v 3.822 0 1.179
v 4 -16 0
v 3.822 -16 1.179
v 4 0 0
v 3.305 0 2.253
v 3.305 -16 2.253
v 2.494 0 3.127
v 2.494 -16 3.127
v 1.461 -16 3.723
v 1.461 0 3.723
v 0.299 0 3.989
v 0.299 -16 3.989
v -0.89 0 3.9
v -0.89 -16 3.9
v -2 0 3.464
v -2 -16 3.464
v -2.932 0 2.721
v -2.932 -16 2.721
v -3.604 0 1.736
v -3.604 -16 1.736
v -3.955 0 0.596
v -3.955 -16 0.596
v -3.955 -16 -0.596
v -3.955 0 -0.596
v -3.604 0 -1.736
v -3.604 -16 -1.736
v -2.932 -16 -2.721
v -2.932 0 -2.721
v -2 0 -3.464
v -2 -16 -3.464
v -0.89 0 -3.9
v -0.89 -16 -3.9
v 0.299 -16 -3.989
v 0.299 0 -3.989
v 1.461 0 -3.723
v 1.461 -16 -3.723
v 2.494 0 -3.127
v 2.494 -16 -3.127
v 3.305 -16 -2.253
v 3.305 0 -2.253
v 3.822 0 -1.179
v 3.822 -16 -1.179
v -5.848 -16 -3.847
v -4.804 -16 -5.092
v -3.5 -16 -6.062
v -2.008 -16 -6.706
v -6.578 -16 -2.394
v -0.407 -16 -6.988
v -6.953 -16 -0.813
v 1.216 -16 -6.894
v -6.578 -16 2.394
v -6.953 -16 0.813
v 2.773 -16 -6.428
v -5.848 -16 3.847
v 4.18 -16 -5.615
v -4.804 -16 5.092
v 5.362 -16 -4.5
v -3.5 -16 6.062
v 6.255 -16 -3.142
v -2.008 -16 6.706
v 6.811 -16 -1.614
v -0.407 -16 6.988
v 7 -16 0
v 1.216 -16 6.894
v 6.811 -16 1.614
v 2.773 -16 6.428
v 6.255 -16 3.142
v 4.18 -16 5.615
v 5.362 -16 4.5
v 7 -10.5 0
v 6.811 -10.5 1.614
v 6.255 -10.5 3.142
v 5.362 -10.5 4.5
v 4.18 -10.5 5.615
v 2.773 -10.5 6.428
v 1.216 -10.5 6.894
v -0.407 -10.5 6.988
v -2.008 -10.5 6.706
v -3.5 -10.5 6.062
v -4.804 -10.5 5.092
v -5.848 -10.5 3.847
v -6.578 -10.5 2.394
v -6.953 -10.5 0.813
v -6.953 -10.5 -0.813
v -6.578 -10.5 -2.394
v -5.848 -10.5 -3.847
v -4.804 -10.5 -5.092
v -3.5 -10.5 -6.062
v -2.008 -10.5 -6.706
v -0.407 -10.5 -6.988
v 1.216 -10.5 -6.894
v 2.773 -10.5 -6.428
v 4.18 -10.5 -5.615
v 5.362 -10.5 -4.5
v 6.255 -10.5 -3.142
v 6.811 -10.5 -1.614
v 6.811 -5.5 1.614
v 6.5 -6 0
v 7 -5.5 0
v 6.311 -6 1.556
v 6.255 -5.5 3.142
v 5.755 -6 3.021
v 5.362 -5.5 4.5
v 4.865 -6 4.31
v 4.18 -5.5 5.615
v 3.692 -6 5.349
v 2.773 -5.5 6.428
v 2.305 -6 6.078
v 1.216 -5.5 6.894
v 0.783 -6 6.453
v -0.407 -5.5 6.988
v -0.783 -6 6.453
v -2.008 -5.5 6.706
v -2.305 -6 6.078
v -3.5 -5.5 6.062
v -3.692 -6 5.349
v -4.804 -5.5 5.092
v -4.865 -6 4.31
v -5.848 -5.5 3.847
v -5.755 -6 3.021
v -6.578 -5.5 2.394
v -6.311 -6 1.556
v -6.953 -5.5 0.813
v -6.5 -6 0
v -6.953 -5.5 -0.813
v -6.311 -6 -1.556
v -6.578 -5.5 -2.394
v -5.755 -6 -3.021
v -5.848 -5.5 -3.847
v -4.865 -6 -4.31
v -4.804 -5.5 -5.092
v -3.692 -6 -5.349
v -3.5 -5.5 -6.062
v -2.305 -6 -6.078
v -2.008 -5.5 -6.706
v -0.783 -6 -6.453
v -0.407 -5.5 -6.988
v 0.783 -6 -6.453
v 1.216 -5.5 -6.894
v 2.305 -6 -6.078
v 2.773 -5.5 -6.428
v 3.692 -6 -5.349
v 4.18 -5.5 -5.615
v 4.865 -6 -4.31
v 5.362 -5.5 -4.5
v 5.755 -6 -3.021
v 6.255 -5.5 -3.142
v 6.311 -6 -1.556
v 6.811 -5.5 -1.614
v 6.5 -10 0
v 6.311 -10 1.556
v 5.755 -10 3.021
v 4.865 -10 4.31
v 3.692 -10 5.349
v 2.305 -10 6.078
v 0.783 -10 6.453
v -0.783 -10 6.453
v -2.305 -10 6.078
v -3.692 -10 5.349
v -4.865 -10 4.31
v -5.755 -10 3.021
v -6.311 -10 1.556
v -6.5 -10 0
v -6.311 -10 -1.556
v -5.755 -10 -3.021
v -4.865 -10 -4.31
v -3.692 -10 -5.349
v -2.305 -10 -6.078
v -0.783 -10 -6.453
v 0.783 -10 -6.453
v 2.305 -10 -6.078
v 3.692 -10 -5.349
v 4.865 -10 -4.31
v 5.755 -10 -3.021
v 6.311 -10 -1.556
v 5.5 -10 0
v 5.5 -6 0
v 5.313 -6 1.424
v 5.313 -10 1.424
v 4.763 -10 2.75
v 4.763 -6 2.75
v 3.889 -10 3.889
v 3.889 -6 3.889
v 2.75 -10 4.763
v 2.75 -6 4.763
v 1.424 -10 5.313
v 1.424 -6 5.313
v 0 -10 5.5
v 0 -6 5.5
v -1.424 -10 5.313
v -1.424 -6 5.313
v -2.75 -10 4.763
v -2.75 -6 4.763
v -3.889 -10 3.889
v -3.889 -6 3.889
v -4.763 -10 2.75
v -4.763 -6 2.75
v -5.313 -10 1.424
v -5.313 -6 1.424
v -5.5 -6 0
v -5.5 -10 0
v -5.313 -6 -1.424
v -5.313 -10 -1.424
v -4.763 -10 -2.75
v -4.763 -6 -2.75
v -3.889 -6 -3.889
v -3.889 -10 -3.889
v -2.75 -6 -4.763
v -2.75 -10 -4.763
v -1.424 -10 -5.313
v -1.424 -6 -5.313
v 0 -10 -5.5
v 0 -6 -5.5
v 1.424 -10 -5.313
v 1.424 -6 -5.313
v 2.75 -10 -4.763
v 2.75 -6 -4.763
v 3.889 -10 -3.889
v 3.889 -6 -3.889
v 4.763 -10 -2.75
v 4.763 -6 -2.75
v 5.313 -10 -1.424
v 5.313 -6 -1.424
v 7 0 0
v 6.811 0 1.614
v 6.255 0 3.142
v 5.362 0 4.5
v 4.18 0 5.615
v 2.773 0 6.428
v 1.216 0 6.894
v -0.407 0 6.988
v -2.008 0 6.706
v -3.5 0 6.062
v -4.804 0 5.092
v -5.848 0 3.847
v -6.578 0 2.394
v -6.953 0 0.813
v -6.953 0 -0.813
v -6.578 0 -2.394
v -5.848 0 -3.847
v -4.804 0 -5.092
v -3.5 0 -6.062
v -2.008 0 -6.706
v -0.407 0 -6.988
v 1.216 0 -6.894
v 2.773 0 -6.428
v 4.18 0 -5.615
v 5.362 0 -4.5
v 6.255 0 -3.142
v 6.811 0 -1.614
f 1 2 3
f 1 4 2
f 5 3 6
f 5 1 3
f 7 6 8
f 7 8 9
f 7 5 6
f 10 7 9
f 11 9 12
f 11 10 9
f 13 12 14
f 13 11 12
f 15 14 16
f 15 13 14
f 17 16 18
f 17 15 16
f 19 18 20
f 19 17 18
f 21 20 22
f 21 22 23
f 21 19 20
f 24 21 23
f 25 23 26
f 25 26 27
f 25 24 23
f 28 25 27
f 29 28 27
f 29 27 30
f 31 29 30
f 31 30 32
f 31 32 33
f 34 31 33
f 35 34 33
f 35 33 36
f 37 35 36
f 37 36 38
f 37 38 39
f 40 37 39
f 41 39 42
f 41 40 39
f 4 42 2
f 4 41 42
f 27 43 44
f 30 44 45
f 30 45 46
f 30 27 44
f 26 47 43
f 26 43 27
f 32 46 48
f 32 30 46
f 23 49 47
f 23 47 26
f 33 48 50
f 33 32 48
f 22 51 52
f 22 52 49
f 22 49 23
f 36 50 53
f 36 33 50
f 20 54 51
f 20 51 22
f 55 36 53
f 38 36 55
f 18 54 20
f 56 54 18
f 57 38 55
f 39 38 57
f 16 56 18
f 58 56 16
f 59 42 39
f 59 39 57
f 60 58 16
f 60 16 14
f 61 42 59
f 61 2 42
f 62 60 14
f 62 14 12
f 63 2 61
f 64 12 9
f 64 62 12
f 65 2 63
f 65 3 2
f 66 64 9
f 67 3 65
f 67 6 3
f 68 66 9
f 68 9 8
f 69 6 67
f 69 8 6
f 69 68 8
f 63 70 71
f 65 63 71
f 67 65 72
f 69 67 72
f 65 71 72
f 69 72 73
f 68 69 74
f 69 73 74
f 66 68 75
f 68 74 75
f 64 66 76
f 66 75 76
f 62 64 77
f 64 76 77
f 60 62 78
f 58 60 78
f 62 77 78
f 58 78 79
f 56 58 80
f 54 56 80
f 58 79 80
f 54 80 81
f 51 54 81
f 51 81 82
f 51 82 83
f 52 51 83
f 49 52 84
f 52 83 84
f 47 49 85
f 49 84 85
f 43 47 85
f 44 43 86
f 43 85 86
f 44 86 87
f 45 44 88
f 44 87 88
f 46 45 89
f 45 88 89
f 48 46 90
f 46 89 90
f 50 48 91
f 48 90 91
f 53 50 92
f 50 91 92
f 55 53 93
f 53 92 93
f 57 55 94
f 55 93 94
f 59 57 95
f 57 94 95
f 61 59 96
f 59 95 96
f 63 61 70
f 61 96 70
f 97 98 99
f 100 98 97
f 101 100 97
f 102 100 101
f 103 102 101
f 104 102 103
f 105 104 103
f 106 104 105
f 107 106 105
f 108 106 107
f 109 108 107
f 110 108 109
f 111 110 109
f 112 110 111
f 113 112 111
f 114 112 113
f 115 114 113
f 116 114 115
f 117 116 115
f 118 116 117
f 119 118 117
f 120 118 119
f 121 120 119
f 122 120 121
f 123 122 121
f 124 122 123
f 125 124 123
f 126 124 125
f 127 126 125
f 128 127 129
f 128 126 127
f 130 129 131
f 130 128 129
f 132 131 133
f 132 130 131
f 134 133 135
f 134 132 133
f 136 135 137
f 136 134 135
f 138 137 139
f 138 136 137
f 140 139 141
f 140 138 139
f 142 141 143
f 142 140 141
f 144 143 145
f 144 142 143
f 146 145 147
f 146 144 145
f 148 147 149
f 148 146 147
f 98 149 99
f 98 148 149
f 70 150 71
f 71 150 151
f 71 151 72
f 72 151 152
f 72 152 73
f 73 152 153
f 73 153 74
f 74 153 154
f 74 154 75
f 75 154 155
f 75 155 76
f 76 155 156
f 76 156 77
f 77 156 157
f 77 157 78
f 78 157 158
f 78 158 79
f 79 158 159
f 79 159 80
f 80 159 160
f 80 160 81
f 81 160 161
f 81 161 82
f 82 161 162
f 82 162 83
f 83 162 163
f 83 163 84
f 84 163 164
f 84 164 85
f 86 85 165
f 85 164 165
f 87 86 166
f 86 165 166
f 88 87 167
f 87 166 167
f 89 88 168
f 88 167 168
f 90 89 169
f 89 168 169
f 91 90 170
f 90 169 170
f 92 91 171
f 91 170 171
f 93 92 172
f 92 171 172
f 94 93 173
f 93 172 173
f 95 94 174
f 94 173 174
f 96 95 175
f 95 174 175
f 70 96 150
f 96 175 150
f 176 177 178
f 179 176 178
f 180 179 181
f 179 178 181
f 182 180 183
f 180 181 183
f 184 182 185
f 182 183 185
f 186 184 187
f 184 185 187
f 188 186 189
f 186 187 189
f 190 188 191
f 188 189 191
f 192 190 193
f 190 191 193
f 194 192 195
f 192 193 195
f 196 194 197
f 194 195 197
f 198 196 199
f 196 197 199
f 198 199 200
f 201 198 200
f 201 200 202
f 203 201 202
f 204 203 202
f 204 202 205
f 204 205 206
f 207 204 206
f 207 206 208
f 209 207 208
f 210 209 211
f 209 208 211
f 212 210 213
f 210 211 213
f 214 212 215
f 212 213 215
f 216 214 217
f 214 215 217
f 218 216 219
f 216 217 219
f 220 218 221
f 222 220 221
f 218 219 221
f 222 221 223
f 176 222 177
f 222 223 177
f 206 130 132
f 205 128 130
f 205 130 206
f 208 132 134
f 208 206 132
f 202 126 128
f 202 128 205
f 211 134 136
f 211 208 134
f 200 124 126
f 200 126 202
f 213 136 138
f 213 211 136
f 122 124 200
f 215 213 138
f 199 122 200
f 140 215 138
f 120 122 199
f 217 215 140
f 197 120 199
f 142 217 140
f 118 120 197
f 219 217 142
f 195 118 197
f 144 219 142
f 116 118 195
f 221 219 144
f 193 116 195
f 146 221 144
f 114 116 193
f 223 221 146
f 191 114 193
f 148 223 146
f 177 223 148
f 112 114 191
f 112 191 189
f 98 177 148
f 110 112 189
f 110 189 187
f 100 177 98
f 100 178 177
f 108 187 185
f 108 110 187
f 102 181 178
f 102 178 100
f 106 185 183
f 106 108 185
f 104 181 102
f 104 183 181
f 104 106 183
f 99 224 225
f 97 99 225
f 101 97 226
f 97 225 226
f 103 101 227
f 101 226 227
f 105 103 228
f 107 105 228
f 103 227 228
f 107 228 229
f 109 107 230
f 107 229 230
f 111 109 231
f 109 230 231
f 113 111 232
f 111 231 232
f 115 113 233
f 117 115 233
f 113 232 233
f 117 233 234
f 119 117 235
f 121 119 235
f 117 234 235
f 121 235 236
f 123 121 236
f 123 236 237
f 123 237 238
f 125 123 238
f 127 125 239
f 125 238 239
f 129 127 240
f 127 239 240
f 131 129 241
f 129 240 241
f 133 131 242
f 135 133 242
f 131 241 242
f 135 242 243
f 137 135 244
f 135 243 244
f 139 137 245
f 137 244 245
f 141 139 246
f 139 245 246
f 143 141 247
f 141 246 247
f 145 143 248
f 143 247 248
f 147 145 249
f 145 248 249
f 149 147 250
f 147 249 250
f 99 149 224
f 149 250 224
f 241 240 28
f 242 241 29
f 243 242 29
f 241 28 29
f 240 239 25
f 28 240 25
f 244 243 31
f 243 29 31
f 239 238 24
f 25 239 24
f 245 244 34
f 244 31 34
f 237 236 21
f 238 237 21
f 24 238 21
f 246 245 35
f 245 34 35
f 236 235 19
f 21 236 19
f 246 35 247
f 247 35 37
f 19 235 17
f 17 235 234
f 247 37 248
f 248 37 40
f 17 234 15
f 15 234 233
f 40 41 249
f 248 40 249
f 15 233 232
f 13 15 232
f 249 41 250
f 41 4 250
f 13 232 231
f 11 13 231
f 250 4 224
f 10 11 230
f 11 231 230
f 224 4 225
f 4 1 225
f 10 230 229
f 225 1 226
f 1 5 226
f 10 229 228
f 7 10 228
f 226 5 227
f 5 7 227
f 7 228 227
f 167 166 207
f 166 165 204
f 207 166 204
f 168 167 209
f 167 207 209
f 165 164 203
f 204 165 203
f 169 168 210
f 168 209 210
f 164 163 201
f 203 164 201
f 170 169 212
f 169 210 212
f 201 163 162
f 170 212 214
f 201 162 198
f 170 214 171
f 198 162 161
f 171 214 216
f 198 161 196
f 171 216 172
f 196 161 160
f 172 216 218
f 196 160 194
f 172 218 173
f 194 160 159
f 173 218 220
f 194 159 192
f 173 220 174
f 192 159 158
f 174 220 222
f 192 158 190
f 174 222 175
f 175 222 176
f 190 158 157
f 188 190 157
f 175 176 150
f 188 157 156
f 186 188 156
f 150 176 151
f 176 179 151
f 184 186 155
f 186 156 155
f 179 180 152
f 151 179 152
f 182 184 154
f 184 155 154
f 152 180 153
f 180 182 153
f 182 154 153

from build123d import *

# Parameters (mm, degrees)
F0_R     = 7
F0_R_2   = 4
F1_DEPTH = 6
F2_R     = 5.5
F2_R_2   = 4
F3_DEPTH = 4
F4_R     = 7
F4_R_2   = 4
F5_DEPTH = 6
F6_SIZE  = 0.5


with BuildPart() as f1:
    # F0 (on Front) → F1 (new body)
    with BuildSketch(Plane.XZ):
        Circle(F0_R)
        Circle(F0_R_2, mode=Mode.SUBTRACT)
    extrude(amount=F1_DEPTH)

    # F2 (on face) → F3 (join)
    with BuildSketch(Plane.XZ.offset(6)):
        Circle(F2_R)
        Circle(F2_R_2, mode=Mode.SUBTRACT)
    extrude(amount=F3_DEPTH)

    # F4 (on face) → F5 (join)
    with BuildSketch(Plane.XZ.offset(10)):
        Circle(F4_R)
        Circle(F4_R_2, mode=Mode.SUBTRACT)
    extrude(amount=F5_DEPTH)

    # F6
    f6_edges = [f1.edges().sort_by_distance(p)[0] for p in [
        (-7, -6, 0),
        (-7, -10, 0),
    ]]
    chamfer(f6_edges, length=F6_SIZE)


solid = f1.part
